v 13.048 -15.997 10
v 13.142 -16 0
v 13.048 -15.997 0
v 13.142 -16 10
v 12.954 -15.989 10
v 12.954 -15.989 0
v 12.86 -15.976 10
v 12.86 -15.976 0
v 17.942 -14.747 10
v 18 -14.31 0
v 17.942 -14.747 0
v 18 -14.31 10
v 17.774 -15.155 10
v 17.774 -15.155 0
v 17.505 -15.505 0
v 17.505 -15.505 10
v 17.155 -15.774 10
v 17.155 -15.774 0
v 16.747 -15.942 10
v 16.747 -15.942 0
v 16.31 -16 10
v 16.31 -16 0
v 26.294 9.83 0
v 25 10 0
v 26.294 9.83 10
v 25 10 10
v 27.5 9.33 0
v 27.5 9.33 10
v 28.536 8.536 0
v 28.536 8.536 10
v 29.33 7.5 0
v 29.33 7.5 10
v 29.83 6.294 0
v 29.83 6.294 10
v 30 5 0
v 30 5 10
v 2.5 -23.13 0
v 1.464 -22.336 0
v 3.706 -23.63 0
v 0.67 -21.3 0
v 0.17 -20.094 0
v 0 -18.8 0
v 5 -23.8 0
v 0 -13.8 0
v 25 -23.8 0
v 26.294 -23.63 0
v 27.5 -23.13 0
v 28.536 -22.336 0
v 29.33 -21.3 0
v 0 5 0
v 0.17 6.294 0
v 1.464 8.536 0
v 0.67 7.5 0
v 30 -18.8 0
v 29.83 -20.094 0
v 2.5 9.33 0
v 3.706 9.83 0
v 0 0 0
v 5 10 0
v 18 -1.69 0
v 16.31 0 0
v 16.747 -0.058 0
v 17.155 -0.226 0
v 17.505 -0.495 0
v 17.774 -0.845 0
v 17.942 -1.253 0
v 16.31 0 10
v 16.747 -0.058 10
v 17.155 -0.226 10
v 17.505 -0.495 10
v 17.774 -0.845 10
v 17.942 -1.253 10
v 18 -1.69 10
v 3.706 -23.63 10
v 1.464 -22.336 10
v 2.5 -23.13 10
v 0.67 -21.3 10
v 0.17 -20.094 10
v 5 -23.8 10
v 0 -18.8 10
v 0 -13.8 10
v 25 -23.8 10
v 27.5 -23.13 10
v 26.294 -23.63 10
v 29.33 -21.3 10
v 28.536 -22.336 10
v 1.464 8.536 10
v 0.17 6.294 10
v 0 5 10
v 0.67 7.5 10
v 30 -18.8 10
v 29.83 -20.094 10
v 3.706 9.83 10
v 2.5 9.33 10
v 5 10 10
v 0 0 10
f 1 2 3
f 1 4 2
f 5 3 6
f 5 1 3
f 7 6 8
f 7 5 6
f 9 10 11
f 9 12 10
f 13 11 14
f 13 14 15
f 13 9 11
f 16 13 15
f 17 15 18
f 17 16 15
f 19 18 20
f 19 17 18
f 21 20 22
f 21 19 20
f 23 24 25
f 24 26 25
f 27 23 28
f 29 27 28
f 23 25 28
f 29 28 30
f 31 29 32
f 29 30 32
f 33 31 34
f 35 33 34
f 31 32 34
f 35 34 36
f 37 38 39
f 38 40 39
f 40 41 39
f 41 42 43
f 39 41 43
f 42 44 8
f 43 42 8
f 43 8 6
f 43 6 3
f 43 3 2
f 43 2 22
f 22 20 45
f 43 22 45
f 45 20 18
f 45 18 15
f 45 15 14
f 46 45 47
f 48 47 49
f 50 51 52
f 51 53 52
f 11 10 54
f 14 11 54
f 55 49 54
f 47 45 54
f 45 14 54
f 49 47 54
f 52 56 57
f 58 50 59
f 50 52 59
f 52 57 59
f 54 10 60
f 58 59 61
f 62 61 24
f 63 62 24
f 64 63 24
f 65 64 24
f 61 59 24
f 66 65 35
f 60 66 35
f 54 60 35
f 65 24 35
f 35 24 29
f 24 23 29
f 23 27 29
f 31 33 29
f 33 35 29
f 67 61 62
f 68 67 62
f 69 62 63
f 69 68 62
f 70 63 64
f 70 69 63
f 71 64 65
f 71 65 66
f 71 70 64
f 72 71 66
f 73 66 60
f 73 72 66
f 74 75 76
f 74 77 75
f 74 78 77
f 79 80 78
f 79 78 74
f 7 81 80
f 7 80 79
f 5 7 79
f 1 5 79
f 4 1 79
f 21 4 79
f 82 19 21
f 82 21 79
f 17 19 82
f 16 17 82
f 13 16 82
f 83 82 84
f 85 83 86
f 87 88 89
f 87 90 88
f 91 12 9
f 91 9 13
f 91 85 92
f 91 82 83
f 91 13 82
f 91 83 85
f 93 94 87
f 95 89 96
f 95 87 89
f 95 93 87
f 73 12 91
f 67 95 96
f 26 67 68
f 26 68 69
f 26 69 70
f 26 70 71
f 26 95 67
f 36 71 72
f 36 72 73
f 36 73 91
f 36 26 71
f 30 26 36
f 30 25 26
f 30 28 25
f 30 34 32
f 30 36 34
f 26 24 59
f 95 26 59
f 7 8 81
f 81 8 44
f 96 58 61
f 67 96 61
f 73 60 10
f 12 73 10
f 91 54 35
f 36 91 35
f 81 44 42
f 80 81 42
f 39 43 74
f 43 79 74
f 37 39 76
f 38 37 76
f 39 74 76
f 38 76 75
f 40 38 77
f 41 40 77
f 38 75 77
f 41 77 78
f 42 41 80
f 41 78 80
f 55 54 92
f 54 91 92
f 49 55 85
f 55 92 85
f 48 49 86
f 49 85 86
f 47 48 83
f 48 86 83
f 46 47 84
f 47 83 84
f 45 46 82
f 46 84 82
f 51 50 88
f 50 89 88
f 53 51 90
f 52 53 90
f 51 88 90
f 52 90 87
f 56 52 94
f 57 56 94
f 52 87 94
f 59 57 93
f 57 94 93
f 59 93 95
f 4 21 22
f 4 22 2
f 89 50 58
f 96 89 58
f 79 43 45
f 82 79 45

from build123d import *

# Parameters (mm, degrees)
F1_DEPTH = 10
F2_R     = 1.689949
F3_R     = 5


with BuildPart() as f1:
    # F0 (on Top) → F1 (new body)
    with BuildSketch(Plane.XY):
        Polygon((0, 10), (0, 0), (18, 0), (18, -16), (13, -16), (0, -13.8), (0, -23.8), (30, -23.8), (30, 10), align=None)
    extrude(amount=F1_DEPTH)

    # F2
    f2_edges = [f1.edges().sort_by_distance(p)[0] for p in [
        (18, 0, 5),
        (18, -16, 5),
        (13, -16, 5),
    ]]
    fillet(f2_edges, radius=F2_R)

    # F3
    f3_edges = [f1.edges().sort_by_distance(p)[0] for p in [
        (0, 10, 5),
        (30, 10, 5),
        (30, -23.8, 5),
        (0, -23.8, 5),
    ]]
    fillet(f3_edges, radius=F3_R)


solid = f1.part
